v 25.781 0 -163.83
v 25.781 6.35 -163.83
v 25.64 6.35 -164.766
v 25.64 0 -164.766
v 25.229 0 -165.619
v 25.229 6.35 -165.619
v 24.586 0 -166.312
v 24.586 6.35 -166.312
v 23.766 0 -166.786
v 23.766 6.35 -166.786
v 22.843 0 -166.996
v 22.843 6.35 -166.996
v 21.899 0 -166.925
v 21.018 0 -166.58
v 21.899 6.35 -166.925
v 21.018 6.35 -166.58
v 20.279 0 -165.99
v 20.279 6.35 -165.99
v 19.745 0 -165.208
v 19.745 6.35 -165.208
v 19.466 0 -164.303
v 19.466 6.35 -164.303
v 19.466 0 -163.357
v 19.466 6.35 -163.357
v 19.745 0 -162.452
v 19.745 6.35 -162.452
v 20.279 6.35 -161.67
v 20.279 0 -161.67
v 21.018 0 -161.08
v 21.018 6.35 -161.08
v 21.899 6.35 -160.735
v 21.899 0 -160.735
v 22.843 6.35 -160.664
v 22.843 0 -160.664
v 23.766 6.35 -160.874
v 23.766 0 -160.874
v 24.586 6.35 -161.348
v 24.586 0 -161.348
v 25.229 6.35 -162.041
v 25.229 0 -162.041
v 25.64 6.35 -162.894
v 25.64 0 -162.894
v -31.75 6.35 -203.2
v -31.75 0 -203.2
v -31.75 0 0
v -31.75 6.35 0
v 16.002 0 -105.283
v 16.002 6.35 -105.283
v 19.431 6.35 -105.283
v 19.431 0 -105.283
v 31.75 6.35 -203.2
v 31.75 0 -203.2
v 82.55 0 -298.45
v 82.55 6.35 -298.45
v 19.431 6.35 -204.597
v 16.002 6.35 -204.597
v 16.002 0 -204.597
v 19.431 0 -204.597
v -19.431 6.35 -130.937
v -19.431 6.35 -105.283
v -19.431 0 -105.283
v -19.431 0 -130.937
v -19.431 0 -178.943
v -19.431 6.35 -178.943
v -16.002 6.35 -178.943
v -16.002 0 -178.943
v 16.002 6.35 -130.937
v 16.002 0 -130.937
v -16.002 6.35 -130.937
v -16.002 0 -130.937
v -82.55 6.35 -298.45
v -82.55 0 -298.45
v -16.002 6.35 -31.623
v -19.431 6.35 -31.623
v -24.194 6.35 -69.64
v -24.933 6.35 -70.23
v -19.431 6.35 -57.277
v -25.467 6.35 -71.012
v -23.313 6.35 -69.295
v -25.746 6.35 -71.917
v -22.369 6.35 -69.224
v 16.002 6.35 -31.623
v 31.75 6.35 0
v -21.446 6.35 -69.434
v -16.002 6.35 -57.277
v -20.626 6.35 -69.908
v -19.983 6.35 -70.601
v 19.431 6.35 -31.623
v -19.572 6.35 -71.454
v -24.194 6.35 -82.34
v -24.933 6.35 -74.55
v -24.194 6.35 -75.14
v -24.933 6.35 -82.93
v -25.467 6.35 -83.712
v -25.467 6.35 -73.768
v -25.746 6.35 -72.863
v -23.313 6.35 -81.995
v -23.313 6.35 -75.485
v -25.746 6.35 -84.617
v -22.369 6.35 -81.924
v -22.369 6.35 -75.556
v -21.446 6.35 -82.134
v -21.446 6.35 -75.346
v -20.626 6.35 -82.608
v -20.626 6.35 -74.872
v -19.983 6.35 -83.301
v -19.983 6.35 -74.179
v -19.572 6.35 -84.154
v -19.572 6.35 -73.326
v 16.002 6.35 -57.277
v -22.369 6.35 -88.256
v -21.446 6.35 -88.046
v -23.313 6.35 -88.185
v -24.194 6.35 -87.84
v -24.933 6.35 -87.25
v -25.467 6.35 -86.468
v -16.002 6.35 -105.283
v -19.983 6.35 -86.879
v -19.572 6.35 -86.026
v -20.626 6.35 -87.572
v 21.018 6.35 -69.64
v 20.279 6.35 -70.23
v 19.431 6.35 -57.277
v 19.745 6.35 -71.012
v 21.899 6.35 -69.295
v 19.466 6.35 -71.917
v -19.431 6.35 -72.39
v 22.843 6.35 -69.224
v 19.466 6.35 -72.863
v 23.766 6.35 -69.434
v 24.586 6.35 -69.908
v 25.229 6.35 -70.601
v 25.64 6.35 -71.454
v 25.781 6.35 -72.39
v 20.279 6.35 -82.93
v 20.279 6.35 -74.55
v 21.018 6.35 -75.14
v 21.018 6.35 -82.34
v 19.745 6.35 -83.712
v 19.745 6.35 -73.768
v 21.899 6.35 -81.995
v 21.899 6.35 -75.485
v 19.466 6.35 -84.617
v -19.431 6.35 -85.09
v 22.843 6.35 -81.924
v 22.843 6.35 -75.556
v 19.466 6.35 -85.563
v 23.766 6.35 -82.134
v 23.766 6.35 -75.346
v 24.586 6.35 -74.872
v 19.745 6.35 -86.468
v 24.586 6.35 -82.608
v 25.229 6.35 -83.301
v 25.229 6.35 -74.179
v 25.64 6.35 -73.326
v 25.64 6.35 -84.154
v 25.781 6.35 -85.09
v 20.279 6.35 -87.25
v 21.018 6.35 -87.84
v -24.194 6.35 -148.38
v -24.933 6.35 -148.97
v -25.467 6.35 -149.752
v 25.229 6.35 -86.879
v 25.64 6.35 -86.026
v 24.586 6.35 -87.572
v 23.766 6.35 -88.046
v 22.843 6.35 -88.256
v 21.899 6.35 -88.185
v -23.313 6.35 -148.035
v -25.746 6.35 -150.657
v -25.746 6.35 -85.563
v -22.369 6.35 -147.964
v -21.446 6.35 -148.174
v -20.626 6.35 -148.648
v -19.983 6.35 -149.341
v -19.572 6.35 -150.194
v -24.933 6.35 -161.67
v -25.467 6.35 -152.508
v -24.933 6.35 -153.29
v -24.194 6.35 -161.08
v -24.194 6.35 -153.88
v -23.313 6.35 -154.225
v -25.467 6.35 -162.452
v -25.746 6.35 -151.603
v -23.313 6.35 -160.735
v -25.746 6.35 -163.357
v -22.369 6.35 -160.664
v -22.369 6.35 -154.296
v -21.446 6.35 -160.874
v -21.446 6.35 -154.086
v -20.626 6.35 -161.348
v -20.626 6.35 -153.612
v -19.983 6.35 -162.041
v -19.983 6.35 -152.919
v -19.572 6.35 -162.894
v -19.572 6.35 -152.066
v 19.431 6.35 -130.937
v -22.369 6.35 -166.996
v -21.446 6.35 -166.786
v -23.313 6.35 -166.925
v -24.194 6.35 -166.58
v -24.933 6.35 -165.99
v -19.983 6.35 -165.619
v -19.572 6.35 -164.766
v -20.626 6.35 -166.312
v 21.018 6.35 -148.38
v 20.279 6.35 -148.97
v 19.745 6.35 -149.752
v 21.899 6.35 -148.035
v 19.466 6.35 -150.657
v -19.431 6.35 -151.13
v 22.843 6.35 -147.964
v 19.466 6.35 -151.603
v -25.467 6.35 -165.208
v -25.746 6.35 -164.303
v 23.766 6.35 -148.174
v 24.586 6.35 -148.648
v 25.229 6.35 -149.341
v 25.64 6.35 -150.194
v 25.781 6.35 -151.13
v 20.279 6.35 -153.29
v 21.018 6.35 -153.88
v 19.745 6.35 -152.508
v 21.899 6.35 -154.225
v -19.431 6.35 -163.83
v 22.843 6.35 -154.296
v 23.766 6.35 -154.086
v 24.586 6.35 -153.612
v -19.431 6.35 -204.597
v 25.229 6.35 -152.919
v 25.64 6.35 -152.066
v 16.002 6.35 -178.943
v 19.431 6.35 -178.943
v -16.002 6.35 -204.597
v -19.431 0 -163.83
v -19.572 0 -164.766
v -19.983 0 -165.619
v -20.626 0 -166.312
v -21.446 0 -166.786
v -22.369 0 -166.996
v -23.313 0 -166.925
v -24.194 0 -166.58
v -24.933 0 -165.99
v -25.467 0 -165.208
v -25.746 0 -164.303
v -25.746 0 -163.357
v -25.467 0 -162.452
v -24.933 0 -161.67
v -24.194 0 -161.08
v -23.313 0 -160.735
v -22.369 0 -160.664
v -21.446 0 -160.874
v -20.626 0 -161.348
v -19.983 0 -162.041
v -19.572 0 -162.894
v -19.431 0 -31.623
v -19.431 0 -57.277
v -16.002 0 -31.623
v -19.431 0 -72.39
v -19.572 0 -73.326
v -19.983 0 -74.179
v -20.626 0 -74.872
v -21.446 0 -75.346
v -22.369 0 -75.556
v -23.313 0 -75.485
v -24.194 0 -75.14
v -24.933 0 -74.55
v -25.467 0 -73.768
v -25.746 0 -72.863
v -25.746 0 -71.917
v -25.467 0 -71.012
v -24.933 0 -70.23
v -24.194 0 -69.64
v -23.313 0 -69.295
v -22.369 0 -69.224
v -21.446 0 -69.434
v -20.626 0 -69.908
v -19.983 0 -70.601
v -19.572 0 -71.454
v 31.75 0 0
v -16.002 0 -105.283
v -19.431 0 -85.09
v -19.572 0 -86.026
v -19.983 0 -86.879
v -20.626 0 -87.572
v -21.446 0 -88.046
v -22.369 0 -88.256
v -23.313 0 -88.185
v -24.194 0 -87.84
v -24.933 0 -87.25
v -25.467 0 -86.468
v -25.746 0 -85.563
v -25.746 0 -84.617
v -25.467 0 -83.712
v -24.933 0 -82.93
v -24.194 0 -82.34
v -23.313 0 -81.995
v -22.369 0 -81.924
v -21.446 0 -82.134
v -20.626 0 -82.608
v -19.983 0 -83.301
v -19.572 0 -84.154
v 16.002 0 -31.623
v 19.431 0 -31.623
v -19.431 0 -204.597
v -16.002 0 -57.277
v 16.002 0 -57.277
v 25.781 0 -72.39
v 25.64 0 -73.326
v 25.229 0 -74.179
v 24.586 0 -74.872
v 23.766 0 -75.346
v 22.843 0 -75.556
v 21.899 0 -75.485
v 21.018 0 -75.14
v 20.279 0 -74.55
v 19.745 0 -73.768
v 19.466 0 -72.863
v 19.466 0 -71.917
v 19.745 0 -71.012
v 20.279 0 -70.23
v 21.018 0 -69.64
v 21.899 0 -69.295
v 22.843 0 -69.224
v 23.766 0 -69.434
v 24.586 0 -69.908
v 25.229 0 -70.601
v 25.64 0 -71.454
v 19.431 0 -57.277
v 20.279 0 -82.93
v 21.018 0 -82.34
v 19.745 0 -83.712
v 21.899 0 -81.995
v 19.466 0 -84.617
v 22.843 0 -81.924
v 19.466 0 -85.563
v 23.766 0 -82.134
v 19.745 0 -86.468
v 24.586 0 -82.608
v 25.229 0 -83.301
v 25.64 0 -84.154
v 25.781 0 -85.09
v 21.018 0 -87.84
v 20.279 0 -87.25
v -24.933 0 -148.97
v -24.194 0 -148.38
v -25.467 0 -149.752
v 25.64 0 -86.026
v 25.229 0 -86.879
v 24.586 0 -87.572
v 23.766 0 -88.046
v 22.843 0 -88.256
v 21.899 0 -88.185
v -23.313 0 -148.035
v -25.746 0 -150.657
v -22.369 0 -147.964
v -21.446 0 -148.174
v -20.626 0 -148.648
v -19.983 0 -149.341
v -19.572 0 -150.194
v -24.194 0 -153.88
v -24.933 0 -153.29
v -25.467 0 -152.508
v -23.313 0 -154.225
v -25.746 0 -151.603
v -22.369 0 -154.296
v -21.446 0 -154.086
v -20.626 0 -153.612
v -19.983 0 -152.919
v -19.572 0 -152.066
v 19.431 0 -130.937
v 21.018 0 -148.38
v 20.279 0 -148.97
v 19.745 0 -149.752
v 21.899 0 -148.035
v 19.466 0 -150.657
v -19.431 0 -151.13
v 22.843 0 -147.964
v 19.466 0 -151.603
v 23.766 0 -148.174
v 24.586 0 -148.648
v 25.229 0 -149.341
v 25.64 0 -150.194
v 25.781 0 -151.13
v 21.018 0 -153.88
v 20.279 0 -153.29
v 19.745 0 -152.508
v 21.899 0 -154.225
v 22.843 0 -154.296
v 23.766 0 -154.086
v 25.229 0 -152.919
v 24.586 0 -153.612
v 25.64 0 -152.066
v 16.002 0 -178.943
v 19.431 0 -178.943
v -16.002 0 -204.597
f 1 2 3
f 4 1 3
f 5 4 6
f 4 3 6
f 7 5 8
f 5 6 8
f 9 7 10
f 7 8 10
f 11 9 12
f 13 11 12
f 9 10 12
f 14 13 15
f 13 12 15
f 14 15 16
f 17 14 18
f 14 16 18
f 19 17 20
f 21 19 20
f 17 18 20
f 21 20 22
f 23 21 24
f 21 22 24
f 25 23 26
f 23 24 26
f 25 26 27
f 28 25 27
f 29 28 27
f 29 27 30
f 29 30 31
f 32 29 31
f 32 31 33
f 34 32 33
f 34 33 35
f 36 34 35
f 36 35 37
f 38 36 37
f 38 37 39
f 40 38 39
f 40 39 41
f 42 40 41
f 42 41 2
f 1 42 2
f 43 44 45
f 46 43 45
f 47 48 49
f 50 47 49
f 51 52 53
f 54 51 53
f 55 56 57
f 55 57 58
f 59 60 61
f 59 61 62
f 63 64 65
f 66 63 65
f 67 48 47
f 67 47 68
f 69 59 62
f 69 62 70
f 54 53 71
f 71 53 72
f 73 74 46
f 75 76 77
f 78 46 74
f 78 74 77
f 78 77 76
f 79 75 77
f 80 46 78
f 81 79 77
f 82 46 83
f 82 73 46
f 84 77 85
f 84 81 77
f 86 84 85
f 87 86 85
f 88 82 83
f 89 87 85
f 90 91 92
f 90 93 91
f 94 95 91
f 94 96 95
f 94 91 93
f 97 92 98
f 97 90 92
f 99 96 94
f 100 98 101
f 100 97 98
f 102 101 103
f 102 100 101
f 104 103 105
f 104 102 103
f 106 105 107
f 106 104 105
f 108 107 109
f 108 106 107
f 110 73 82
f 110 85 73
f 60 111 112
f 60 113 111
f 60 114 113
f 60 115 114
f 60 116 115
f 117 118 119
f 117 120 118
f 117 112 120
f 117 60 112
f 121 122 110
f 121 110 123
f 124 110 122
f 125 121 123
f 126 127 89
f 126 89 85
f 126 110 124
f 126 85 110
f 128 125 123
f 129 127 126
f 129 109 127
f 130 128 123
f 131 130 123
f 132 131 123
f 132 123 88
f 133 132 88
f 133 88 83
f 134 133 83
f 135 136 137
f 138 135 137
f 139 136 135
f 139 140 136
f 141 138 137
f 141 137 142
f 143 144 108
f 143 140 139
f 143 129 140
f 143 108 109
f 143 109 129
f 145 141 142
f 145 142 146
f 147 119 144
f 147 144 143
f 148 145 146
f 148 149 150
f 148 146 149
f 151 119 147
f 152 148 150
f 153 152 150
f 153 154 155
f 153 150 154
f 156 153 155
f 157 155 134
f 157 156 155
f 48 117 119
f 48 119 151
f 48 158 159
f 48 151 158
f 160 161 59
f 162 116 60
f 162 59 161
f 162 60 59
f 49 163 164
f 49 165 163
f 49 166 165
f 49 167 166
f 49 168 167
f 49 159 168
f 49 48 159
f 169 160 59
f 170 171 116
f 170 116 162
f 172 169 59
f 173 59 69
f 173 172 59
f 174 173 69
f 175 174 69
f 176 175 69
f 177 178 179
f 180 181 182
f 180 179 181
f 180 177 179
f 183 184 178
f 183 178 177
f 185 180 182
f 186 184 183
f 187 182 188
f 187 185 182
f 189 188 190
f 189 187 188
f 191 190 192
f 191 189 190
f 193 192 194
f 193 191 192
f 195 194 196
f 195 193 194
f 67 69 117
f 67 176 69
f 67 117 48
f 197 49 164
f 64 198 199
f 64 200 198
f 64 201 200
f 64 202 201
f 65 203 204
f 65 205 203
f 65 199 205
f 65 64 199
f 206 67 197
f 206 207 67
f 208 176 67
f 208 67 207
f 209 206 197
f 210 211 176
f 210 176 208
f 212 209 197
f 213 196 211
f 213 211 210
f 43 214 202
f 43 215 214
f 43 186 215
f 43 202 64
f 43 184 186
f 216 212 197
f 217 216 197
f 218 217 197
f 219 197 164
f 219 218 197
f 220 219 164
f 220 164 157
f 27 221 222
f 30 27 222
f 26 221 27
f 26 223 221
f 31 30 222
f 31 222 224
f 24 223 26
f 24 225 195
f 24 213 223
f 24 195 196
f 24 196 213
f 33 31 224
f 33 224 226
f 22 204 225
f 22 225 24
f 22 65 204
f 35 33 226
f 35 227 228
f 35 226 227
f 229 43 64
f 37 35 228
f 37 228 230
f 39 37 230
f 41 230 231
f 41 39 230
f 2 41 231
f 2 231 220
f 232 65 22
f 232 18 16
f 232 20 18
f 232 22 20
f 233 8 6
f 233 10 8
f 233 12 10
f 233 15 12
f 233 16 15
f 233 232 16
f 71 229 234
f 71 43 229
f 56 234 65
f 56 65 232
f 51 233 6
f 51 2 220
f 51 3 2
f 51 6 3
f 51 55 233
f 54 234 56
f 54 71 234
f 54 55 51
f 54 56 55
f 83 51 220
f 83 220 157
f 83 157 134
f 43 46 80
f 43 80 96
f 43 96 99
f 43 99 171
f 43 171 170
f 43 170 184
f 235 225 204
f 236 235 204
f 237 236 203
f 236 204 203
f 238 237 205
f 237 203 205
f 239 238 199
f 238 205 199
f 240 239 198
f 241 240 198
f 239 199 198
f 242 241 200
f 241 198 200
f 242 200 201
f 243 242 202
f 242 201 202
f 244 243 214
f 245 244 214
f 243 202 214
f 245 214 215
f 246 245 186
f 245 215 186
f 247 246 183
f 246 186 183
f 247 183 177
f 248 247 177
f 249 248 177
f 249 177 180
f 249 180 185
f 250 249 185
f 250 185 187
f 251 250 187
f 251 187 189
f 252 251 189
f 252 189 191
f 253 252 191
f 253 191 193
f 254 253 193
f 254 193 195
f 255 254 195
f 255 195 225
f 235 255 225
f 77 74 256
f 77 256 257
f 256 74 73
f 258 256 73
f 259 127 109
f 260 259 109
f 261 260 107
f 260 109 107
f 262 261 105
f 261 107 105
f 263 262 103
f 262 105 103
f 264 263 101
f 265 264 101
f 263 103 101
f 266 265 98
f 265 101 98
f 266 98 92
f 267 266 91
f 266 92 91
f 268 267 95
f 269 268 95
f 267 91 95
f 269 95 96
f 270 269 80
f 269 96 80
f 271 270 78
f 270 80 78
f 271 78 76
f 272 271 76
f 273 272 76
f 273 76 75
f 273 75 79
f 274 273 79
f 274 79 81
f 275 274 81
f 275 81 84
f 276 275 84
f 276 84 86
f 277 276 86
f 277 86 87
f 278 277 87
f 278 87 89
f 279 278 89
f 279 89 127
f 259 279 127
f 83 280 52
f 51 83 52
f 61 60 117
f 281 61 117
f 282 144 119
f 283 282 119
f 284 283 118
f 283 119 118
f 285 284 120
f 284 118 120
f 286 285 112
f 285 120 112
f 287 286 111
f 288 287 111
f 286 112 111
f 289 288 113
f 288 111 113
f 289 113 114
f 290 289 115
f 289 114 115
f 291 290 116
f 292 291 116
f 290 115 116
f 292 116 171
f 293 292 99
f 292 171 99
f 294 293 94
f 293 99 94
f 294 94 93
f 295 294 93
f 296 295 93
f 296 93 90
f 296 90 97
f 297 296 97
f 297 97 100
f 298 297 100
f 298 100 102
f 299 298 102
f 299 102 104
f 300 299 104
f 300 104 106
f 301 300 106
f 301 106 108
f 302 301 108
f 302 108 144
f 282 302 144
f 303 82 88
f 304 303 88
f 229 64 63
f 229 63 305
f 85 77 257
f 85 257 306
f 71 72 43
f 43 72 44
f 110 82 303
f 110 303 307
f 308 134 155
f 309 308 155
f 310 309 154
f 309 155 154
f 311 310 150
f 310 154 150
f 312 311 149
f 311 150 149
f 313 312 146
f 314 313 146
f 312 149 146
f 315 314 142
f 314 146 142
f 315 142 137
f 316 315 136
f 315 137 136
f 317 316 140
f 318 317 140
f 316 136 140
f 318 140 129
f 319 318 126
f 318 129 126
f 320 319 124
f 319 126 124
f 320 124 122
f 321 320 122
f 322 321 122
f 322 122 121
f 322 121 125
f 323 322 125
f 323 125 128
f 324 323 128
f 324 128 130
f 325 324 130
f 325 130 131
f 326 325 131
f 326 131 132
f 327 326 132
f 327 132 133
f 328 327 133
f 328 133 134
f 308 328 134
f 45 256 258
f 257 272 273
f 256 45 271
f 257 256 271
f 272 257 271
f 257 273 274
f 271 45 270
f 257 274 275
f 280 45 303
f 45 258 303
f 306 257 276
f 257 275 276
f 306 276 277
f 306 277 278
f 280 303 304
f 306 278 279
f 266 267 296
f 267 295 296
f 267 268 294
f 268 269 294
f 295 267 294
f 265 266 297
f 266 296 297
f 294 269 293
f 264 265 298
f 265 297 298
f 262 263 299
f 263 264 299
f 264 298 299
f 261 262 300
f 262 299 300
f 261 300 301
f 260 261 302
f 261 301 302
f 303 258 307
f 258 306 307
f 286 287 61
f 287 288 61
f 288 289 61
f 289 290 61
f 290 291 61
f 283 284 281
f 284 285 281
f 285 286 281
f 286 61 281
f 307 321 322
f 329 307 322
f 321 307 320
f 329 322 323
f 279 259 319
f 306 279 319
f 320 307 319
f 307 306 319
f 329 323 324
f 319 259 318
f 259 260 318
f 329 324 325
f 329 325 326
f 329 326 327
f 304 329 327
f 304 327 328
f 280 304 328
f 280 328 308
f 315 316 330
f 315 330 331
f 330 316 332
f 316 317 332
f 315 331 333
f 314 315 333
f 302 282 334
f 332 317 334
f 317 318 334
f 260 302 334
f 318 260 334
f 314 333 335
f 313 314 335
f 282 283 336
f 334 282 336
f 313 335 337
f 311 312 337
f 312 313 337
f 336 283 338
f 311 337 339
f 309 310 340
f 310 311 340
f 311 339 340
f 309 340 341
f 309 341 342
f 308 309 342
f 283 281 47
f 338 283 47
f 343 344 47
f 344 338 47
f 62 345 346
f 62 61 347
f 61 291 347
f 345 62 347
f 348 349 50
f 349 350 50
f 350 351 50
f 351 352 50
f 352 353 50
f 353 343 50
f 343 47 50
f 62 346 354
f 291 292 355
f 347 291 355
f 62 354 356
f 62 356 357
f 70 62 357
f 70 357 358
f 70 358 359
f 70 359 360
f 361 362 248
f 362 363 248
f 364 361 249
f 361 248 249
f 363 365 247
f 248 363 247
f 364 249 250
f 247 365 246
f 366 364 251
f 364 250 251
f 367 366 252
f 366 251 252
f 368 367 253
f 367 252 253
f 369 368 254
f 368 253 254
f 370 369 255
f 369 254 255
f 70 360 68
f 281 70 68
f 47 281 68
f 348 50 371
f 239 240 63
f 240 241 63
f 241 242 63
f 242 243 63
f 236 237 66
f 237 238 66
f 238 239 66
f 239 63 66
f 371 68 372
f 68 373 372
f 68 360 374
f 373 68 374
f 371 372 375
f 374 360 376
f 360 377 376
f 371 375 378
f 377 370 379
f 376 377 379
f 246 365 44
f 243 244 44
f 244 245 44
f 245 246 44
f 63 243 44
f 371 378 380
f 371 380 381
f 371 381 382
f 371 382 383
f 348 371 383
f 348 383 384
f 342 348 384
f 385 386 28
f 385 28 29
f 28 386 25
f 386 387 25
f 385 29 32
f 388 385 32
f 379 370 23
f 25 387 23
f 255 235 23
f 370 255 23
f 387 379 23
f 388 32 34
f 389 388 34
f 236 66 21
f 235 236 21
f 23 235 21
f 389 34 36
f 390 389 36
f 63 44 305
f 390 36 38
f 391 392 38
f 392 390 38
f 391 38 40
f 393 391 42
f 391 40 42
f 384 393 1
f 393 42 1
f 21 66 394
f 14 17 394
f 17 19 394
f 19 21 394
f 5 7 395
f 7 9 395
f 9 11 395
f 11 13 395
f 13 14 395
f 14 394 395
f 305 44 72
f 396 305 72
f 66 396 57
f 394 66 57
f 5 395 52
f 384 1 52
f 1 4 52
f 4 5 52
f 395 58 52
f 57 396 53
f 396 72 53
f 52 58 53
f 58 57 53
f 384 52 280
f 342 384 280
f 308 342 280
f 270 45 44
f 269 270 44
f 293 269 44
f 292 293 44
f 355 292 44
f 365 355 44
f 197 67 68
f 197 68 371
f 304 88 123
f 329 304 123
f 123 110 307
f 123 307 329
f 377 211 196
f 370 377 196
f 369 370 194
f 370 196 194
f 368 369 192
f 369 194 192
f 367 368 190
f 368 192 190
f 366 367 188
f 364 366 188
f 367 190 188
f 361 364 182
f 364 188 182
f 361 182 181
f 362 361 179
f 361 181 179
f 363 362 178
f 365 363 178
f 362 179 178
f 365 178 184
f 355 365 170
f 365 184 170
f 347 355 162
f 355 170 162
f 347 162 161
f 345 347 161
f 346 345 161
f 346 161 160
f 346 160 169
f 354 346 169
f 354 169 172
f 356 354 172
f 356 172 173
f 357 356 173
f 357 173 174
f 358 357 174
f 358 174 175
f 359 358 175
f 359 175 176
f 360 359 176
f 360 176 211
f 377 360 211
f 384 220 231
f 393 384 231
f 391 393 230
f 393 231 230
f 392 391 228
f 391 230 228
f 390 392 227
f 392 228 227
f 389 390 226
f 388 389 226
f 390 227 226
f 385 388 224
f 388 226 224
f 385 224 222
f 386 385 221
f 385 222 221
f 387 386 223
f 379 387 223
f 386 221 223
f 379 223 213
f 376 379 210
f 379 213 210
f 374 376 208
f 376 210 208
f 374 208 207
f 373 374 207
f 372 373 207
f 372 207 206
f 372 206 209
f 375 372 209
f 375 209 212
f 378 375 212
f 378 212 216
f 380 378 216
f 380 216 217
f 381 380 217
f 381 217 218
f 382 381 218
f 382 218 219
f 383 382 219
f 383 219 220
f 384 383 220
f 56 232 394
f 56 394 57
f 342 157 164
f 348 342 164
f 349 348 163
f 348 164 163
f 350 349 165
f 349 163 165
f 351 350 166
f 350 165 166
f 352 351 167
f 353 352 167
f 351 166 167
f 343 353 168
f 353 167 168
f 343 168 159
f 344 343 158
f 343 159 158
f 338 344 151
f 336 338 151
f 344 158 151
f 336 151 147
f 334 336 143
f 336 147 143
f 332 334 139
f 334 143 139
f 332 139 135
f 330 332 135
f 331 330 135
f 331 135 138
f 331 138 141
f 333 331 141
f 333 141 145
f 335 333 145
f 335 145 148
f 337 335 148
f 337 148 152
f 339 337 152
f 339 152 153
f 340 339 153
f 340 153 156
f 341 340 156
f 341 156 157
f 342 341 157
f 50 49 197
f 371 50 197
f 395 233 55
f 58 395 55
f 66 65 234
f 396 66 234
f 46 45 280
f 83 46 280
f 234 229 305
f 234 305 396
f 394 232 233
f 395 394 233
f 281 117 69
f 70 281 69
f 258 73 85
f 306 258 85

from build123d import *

# Parameters (mm, degrees)
BOSS_EXTRUDE1_DEPTH = 6.35
SKETCH2_W           = 3.429
SKETCH2_H           = 25.654
CUT_EXTRUDE1_DEPTH  = 7.35
SKETCH3_R           = 3.175
CUT_EXTRUDE2_DEPTH  = 7.35


with BuildPart() as part:
    # Sketch1 → Boss-Extrude1 (new body)
    with BuildSketch(Plane(origin=(0, 0, 0), x_dir=(1, 0, 0), z_dir=(0, 1, 0))):
        Polygon((-31.75, 0), (31.75, 0), (31.75, 203.2), (82.55, 298.45), (-82.55, 298.45), (-31.75, 203.2), align=None)
    extrude(amount=BOSS_EXTRUDE1_DEPTH)

    # Sketch2 → Cut-Extrude1 (cut, through all)
    with BuildSketch(Plane(origin=(0, 6.35, 0), x_dir=(1, 0, 0), z_dir=(0, 1, 0))):
        with Locations((-17.7165, 44.45)):
            Rectangle(SKETCH2_W, SKETCH2_H)
        with Locations((-17.7165, 118.11)):
            Rectangle(SKETCH2_W, SKETCH2_H)
        with Locations((-17.7165, 191.77)):
            Rectangle(SKETCH2_W, SKETCH2_H)
        with Locations((17.7165, 191.77)):
            Rectangle(SKETCH2_W, SKETCH2_H)
        with Locations((17.7165, 118.11)):
            Rectangle(SKETCH2_W, SKETCH2_H)
        with Locations((17.7165, 44.45)):
            Rectangle(SKETCH2_W, SKETCH2_H)
    extrude(amount=-CUT_EXTRUDE1_DEPTH, mode=Mode.SUBTRACT)

    # Sketch3 → Cut-Extrude2 (cut, through all)
    with BuildSketch(Plane(origin=(0, 6.35, 0), x_dir=(1, 0, 0), z_dir=(0, 1, 0))):
        with Locations((-22.606, 163.83)):
            Circle(SKETCH3_R)
        with Locations((-22.606, 151.13)):
            Circle(SKETCH3_R)
        with Locations((22.606, 151.13)):
            Circle(SKETCH3_R)
        with Locations((22.606, 163.83)):
            Circle(SKETCH3_R)
        with Locations((22.606, 85.09)):
            Circle(SKETCH3_R)
        with Locations((22.606, 72.39)):
            Circle(SKETCH3_R)
        with Locations((-22.606, 72.39)):
            Circle(SKETCH3_R)
        with Locations((-22.606, 85.09)):
            Circle(SKETCH3_R)
    extrude(amount=-CUT_EXTRUDE2_DEPTH, mode=Mode.SUBTRACT)


solid = part.part
